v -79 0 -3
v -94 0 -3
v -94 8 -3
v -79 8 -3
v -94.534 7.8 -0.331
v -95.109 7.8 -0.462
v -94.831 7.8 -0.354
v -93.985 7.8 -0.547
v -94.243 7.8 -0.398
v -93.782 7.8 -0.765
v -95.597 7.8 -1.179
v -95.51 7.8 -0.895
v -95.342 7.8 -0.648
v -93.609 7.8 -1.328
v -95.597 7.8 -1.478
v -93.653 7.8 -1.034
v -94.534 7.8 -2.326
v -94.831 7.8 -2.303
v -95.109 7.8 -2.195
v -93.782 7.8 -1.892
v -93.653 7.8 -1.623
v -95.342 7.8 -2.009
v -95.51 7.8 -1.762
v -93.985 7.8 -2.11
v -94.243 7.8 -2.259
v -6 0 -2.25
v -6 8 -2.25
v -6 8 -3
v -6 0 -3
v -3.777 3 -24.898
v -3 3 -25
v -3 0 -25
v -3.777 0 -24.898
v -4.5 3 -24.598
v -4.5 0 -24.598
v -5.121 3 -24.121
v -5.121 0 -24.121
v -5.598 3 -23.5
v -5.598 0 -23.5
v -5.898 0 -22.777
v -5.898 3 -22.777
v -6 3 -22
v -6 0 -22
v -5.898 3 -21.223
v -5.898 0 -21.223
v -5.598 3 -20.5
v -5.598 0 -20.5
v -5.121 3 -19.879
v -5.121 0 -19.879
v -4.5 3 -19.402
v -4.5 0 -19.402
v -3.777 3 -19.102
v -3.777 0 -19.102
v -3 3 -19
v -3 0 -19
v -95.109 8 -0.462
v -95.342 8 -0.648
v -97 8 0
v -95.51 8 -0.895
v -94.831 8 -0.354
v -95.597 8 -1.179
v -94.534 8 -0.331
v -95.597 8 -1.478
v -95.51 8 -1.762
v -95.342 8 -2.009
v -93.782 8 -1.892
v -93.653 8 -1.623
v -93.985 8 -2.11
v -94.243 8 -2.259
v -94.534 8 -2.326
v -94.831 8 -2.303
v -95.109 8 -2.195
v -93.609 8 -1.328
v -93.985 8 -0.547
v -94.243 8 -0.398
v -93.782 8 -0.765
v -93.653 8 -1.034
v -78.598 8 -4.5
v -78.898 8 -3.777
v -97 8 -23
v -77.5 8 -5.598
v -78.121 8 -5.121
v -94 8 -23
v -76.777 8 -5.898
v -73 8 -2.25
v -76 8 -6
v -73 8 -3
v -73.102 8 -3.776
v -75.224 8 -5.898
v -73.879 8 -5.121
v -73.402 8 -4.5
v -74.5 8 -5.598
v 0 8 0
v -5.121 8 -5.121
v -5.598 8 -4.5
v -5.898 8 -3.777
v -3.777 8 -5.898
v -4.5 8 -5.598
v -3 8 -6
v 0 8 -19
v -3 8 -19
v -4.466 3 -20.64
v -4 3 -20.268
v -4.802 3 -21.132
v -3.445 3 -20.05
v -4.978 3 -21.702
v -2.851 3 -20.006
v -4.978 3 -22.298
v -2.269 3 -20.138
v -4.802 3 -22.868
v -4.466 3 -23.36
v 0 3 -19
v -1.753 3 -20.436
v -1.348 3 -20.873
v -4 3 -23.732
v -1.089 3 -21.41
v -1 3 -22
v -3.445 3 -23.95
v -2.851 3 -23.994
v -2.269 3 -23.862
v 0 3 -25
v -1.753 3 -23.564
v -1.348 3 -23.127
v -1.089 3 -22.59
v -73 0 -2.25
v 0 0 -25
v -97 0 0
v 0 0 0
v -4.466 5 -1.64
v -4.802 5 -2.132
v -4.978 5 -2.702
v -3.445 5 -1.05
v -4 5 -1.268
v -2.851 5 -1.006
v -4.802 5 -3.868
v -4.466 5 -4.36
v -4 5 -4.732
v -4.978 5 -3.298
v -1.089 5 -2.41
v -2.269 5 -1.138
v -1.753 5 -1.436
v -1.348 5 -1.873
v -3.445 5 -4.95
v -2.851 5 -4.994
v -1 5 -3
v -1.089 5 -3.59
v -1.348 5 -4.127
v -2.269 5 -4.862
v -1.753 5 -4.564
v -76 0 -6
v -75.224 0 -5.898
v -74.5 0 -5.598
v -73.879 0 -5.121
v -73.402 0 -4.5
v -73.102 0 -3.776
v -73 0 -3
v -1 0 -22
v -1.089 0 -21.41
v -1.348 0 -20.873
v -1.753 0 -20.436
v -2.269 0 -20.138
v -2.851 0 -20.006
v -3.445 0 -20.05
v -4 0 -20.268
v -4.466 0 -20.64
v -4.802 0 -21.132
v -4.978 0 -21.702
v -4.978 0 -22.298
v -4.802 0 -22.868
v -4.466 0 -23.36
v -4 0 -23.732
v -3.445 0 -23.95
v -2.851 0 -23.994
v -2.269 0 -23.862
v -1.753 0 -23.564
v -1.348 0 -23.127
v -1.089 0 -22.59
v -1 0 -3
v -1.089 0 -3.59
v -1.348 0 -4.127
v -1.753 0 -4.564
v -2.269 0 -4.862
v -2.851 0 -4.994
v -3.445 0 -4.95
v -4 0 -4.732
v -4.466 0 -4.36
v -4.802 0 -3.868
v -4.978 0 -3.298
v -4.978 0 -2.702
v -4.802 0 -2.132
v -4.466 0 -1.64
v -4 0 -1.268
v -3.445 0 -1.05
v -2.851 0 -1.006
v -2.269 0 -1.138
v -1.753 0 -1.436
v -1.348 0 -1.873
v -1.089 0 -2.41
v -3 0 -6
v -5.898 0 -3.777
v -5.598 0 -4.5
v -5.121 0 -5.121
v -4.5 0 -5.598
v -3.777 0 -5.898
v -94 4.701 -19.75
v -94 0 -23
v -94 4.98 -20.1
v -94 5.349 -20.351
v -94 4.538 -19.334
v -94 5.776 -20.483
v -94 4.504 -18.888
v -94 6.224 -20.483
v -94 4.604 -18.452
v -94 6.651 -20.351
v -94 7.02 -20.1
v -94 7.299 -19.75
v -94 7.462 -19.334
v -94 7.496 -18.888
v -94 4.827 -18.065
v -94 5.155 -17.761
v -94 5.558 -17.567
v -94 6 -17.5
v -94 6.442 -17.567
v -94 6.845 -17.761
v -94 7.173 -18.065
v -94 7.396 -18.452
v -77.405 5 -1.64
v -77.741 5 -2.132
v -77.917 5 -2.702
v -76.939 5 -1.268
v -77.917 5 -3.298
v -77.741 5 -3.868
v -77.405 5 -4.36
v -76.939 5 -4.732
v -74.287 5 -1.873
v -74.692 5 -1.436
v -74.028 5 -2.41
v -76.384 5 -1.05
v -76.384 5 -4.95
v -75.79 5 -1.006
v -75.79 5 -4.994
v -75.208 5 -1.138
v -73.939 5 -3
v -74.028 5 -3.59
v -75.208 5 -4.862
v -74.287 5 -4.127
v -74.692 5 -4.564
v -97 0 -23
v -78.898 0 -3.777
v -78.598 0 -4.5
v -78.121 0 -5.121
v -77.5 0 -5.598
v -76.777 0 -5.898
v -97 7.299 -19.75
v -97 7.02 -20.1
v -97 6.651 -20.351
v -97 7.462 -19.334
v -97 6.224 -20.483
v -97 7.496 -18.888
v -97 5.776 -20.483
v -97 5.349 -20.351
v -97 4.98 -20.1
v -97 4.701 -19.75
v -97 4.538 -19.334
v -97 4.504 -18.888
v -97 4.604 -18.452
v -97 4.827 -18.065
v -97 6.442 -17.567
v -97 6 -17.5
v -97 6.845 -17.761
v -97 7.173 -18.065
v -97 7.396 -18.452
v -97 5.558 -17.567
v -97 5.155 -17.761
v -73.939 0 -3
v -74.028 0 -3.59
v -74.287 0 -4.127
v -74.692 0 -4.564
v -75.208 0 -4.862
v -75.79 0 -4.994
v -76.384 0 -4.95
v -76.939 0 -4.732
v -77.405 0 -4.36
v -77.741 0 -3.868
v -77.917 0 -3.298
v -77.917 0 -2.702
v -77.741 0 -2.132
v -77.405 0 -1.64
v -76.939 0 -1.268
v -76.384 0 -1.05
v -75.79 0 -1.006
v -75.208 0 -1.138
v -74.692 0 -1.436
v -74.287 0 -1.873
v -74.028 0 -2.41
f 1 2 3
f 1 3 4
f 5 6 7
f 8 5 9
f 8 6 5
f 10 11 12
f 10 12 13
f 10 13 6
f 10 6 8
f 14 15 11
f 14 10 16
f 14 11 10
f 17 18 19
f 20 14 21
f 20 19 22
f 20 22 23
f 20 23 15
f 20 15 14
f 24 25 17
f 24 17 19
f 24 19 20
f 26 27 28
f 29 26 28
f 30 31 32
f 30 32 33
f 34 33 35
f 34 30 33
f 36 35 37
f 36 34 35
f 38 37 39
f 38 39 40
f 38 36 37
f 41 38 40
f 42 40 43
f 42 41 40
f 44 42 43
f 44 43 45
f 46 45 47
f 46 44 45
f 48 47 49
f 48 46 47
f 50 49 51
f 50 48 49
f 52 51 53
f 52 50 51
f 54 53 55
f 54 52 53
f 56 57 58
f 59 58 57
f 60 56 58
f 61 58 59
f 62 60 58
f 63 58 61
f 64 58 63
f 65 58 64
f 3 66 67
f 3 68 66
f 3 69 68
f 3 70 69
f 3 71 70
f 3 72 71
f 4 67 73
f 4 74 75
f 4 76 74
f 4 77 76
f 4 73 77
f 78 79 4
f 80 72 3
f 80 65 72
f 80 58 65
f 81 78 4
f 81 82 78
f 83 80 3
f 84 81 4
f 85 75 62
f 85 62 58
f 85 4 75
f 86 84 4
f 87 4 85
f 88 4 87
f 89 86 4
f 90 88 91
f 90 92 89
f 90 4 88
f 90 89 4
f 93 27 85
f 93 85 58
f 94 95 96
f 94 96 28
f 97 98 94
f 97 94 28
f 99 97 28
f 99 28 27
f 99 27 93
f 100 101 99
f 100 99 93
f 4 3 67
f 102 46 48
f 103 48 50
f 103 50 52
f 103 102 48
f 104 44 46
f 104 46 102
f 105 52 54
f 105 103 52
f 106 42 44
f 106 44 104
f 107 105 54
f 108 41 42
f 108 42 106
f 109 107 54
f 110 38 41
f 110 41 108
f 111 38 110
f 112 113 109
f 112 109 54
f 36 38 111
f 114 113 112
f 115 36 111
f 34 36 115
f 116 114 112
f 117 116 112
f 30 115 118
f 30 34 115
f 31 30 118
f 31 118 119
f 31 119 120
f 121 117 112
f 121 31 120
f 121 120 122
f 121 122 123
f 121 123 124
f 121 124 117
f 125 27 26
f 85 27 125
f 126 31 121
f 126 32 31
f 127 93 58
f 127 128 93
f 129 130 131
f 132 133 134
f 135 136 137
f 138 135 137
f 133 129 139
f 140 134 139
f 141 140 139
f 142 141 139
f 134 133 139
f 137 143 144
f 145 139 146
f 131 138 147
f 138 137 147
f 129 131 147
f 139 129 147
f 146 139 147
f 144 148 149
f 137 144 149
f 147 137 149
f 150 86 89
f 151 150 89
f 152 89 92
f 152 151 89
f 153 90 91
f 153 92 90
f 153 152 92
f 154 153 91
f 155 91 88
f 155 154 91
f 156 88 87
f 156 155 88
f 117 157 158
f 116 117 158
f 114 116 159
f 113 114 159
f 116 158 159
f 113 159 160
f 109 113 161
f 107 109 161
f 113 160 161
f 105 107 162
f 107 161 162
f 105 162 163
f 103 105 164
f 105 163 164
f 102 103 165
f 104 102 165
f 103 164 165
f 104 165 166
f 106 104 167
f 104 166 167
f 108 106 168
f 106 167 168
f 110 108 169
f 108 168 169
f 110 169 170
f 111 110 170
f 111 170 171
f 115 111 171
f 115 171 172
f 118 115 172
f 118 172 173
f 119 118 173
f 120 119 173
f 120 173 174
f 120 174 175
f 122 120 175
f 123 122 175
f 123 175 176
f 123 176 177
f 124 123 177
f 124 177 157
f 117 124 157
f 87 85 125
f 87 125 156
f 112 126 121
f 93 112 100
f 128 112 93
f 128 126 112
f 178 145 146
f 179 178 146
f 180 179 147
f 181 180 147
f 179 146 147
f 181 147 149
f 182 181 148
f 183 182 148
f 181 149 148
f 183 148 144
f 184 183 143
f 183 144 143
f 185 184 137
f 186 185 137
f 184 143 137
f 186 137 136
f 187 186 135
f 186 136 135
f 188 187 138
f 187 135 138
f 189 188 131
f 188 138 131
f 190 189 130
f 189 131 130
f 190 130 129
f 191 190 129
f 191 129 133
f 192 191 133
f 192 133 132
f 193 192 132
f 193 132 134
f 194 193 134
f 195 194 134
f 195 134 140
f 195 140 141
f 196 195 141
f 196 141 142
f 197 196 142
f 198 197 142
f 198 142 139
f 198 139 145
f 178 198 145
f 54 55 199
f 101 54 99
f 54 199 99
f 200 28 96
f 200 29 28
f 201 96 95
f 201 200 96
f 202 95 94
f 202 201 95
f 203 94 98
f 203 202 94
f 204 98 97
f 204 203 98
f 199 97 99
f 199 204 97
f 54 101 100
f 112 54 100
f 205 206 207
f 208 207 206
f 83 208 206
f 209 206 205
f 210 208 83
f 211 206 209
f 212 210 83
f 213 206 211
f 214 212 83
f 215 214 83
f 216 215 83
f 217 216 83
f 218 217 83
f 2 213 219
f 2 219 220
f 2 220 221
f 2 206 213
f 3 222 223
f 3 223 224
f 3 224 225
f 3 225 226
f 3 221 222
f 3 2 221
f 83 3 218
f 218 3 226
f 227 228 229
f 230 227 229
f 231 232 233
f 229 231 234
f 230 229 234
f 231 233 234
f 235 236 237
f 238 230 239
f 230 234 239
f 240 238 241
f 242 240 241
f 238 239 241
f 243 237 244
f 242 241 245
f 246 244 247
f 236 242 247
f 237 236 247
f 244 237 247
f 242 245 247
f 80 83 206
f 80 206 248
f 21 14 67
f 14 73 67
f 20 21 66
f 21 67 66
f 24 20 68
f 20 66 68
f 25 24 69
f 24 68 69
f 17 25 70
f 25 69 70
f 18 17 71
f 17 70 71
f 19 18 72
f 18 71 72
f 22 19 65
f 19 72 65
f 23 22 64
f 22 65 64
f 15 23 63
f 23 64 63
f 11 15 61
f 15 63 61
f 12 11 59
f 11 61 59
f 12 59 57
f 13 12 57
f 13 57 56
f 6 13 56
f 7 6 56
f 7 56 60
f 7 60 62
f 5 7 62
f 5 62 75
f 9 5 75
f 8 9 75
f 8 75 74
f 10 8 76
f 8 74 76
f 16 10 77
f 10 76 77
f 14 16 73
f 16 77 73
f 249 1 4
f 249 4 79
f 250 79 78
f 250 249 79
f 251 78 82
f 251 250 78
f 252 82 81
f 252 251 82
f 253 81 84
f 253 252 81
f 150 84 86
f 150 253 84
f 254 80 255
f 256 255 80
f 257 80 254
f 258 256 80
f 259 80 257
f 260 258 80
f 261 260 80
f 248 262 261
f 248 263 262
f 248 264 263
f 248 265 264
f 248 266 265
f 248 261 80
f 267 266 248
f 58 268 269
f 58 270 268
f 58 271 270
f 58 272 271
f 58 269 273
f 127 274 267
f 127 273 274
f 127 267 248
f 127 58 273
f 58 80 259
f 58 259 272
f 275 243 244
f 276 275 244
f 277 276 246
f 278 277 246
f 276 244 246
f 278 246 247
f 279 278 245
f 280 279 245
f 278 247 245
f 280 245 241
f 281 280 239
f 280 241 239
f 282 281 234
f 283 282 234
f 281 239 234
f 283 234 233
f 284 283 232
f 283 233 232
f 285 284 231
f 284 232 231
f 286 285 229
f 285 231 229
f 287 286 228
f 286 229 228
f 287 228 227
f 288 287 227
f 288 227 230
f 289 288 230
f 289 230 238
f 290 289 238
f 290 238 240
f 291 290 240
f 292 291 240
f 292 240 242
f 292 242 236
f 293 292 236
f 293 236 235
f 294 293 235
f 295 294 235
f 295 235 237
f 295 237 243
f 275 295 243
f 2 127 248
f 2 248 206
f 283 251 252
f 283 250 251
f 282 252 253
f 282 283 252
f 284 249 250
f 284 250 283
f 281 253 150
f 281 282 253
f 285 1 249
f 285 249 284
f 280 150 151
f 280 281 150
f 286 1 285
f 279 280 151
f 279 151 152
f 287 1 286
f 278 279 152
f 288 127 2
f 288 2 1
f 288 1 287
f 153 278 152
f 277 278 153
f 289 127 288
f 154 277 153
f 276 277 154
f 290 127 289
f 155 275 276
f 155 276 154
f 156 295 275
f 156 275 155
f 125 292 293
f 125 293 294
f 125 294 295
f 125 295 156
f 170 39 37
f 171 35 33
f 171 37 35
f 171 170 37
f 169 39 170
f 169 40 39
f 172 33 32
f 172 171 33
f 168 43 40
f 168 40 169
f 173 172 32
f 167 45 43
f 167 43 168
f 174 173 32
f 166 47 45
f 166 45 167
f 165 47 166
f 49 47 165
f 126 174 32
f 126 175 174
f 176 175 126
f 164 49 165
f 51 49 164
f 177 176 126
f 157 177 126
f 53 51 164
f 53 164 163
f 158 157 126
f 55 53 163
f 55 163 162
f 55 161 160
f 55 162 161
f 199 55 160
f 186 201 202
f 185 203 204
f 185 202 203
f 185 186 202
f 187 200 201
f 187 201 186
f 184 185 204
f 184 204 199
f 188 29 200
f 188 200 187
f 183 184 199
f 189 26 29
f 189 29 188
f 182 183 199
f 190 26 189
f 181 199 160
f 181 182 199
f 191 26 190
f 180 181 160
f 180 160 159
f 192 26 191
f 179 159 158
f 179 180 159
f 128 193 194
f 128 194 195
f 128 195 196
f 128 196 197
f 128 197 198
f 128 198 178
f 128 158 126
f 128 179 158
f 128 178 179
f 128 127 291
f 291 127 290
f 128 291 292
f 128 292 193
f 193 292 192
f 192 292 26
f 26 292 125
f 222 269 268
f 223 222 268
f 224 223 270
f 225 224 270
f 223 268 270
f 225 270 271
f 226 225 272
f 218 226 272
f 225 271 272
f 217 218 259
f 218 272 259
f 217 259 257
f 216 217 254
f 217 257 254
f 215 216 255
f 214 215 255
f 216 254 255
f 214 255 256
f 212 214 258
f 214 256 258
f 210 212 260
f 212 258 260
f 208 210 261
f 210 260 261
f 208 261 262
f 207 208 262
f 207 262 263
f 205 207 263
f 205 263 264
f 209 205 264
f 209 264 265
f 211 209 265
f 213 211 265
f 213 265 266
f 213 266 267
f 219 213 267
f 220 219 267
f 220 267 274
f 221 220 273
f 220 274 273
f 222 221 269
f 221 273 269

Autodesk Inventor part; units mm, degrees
ref_plane "YZ Plane" through (0, 0, 0) normal (1, 0, 0) x (0, 1, 0)
ref_plane "XZ Plane" through (0, 0, 0) normal (0, 1, 0) x (-1, 0, 0)
ref_plane "XY Plane" through (0, 0, 0) normal (0, 0, 1) x (1, 0, 0)
sketch "Szkic1" plane through (0, 0, 0) normal (0, 1, 0) x (-1, 0, 0)
  line L0 (0, 0) -> (97, 0)
  line L1 (97, 0) -> (97, -3)
  line L2 (97, -3) -> (0, -3)
  line L3 (0, -3) -> (0, 0)
  dimension "d0" = 97
  dimension "d1" = 3
extrude "Wyciągnięcie proste1" add sketch "Szkic1" along normal blind 8
sketch "Szkic2" plane through (0, 8, 0) normal (0, 1, 0) x (1, 0, 0)
  circle A0 centre (-94.6086, 1.3285) radius 1
  point P0 (0, 0)
  dimension "d4" = 2
extrude "Wyciągnięcie proste2" cut sketch "Szkic2" against normal blind 0.2
sketch "Szkic3" plane through (0, 0, -3) normal (0, 0, -1) x (-1, 0, 0)
  line L0 (0, 8) -> (97, 8) projected
  line L1 (0, 0) -> (3, 0)
  line L2 (3, 0) -> (3, 8)
  line L3 (3, 8) -> (0, 8)
  line L4 (0, 8) -> (0, 0)
  line L5 (0, 0) -> (97, 0) projected
  line L6 (97, 0) -> (94, 0)
  line L7 (94, 0) -> (94, 8)
  line L8 (94, 8) -> (97, 8)
  line L9 (97, 8) -> (97, 0)
  dimension "d7" = 3
  dimension "d8" = 3
extrude "Wyciągnięcie proste3" add sketch "Szkic3" along normal blind 19 contours L0 L2 L1 L4
extrude "Wyciągnięcie proste4" add sketch "Szkic3" along normal blind 20 contours L0 L9 L5 L7
sketch "Szkic4" plane through (-3, 0, -3) normal (-1, 0, 0) x (0, 0, 1)
  line L0 (-19, 0) -> (-19, 8) projected
  line L1 (0, 0) -> (-19, 0) projected
  line L2 (-19, 8) -> (-14, 8)
  line L3 (-14, 8) -> (-14, 0)
  line L4 (-14, 0) -> (-19, 0)
  line L5 (-19, 0) -> (-19, 8)
  point P0 (3, 0)
  dimension "d13" = 5
extrude "Wyciągnięcie proste5" add sketch "Szkic4" along normal blind 3
sketch "Szkic5" plane through (0, 8, 0) normal (0, 1, 0) x (1, 0, 0)
  line L0 (-3, 3) -> (-3, 17) projected
  line L1 (-3, 3) -> (-6, 3)
  line L2 (-6, 3) -> (-6, 6)
  line L3 (-6, 6) -> (-3, 6)
  line L4 (-3, 6) -> (-3, 3)
  point P0 (0, 0)
  dimension "d16" = 3
  dimension "d17" = 3
extrude "Wyciągnięcie proste6" add sketch "Szkic5" against normal blind 8
sketch "Szkic6" plane through (0, 8, 0) normal (0, 1, 0) x (1, 0, 0)
  line L0 (0, 0) -> (-6, 6)
  line L1 (-97, 0) -> (0, 0) projected
  line L2 (-6, 0) -> (0, 6)
  line L3 (0, 0) -> (0, 22) projected
  circle A0 centre (-3, 3) radius 2
  dimension "d20" = 4
extrude "Wyciągnięcie proste7" cut sketch "Szkic6" against normal blind 8 contours A0 L2 L0 | L0 L2 A0 | L2 A0 L0 | L0 A0 L2
sketch "Szkic7" plane through (0, 8, 0) normal (0, 1, 0) x (1, 0, 0)
  circle A0 centre (-3, 3) radius 2 projected
  circle A1 centre (-3, 3) radius 2
  point P0 (0, 0)
extrude "Wyciągnięcie proste8" add sketch "Szkic7" against normal blind 3
sketch "Szkic8" plane through (0, 8, 0) normal (0, 1, 0) x (1, 0, 0)
  line L0 (-6, 3) -> (-94, 3) projected
  line L1 (-79, 3) -> (-73, 3)
  line L2 (-73, 3) -> (-73, 6)
  line L3 (-73, 6) -> (-79, 6)
  line L4 (-79, 6) -> (-79, 3)
  line L5 (-3, 6) -> (-3, 17) projected
  point P0 (0, 0)
  dimension "d25" = 6
  dimension "d26" = 3
  dimension "d27" = 70
extrude "Wyciągnięcie proste9" add sketch "Szkic8" against normal blind 8
sketch "Szkic9" plane through (0, 8, 0) normal (0, 1, 0) x (1, 0, 0)
  line L0 (-73, 3) -> (-73, 6) projected
  line L1 (-73, 6) -> (-78.8804, 0)
  line L2 (-97, 0) -> (0, 0) projected
  line L3 (-79, 3) -> (-79, 6) projected
  line L4 (-79, 6) -> (-72.878, 0)
  circle A0 centre (-75.939, 3) radius 2
  dimension "d30" = 4
extrude "Wyciągnięcie proste10" cut sketch "Szkic9" against normal blind 8 contours A0 L4 L1 | L1 L4 A0 | L4 A0 L1 | L1 A0 L4
sketch "Szkic10" plane through (0, 8, 0) normal (0, 1, 0) x (1, 0, 0)
  circle A0 centre (-75.939, 3) radius 2 projected
  circle A1 centre (-75.939, 3) radius 2
  point P0 (0, 0)
extrude "Wyciągnięcie proste11" add sketch "Szkic10" against normal blind 3
sketch "Szkic11" plane through (-6, 0, -3) normal (0, 0, -1) x (-1, 0, 0)
  line L0 (67, 8) -> (67, 0) projected
  line L1 (91, 0) -> (-6, 0) projected
  line L2 (67, 8) -> (54, 8)
  line L3 (54, 8) -> (54, 0)
  line L4 (54, 0) -> (67, 0)
  line L5 (67, 0) -> (67, 8)
  dimension "d35" = 13
extrude "Wyciągnięcie proste12" cut sketch "Szkic11" against normal blind 0.5
sketch "Szkic13" plane through (-6, 0, -3) normal (0, 0, -1) x (-1, 0, 0)
  line L0 (54, 0) -> (54, 8) projected
  line L1 (0, 0) -> (0, 8) projected
  line L2 (54, 8) -> (0, 8)
  line L3 (0, 8) -> (0, 0)
  line L4 (0, 0) -> (54, 0)
  line L5 (54, 0) -> (54, 8)
  point P0 (-6, 0)
extrude "Wyciągnięcie proste14" cut sketch "Szkic13" against normal blind 0.75
sketch "Szkic14" plane through (-6, 0, -2.5) normal (0, 0, -1) x (-1, 0, 0)
  line L0 (67, 0) -> (54, 0) projected
  line L1 (67, 8) -> (67, 0) projected
  line L2 (54, 0) -> (67, 0)
  line L3 (67, 0) -> (67, 8)
  line L4 (67, 8) -> (54, 8)
  line L5 (54, 8) -> (54, 0)
  point P0 (-6, 0)
extrude "Wyciągnięcie proste15" cut sketch "Szkic14" against normal blind 0.25
sketch "Szkic15" plane through (-97, 0, 0) normal (-1, 0, 0) x (0, 0, 1)
  circle A0 centre (-19, 6) radius 1.5
  line L0 (-23, 0) -> (-23, 8) projected
  line L1 (0, 8) -> (-23, 8) projected
  point P0 (0, 0)
  dimension "d44" = 3
  dimension "d45" = 4
  dimension "d46" = 2
extrude "Wyciągnięcie proste16" cut sketch "Szkic15" against normal up to surface (3 mm away)
sketch "Szkic16" plane through (0, 0, 0) normal (0, -1, 0) x (1, 0, 0)
  line L0 (-3, -6) -> (-3, -17) projected
  line L1 (-6, -22) -> (-6, -17) projected
  line L2 (-3, -17) -> (-6, -17)
  line L3 (-6, -17) -> (-6, -22)
  line L4 (-6, -22) -> (-3, -22)
  line L5 (-3, -22) -> (-3, -17)
  point P0 (0, 0)
extrude "Wyciągnięcie proste17" cut sketch "Szkic16" against normal blind 8
sketch "Szkic17" plane through (0, 0, 0) normal (0, -1, 0) x (1, 0, 0)
  line L0 (0, 0) -> (0, -22) projected
  line L1 (0, -22) -> (-3, -22)
  line L2 (-3, -22) -> (-3, -19)
  line L3 (-3, -19) -> (0, -19)
  line L4 (0, -19) -> (0, -22)
  line L5 (0, -19) -> (-6, -19)
  line L6 (-6, -19) -> (-6, -25)
  line L7 (-6, -25) -> (0, -25)
  line L8 (0, -25) -> (0, -19)
  dimension "d51" = 3
  dimension "d52" = 3
  dimension "d53" = 6
  dimension "d54" = 6
extrude "Wyciągnięcie proste18" add sketch "Szkic17" against normal blind 3 contours L8 L7 L6 L5 L2 L1
sketch "Szkic18" plane through (0, 8, 0) normal (0, 1, 0) x (1, 0, 0)
  line L0 (0, 22) -> (-3, 22) projected
  line L1 (-3, 22) -> (-3, 19) projected
  line L2 (0, 22) -> (-3, 22)
  line L3 (-3, 22) -> (-3, 19)
  line L4 (-3, 19) -> (0, 19)
  line L5 (0, 19) -> (0, 22)
  point P0 (0, 0)
extrude "Wyciągnięcie proste19" cut sketch "Szkic18" against normal blind 5
sketch "Szkic19" plane through (0, 0, 0) normal (0, -1, 0) x (1, 0, 0)
  point P0 (0, 0)
sketch "Szkic20" plane through (0, 0, 0) normal (0, -1, 0) x (1, 0, 0)
  circle A0 centre (-3, -22) radius 2
  line L0 (-6, -25) -> (0, -25) projected
  line L1 (-6, -19) -> (-6, -25) projected
  point P0 (0, 0)
  point P1 (-6, -22)
  dimension "d59" = 4
  dimension "d60" = 3
  dimension "d61" = 3
extrude "Wyciągnięcie proste20" cut sketch "Szkic20" against normal blind 3
fillet "Fillet1" radius 3 2 edges at (-6, 1.5, -25) (-6, 1.5, -19)
fillet "Fillet2" radius 3 1 edges at (-6, 4, -6)
fillet "Zaokrąglenie3" radius 3 1 edges at (-73, 4, -6)
fillet "Zaokrąglenie4" radius 3 1 edges at (-79, 4, -6)
properties part number "lewasciana" material "Tworzywo sztuczne PET"
